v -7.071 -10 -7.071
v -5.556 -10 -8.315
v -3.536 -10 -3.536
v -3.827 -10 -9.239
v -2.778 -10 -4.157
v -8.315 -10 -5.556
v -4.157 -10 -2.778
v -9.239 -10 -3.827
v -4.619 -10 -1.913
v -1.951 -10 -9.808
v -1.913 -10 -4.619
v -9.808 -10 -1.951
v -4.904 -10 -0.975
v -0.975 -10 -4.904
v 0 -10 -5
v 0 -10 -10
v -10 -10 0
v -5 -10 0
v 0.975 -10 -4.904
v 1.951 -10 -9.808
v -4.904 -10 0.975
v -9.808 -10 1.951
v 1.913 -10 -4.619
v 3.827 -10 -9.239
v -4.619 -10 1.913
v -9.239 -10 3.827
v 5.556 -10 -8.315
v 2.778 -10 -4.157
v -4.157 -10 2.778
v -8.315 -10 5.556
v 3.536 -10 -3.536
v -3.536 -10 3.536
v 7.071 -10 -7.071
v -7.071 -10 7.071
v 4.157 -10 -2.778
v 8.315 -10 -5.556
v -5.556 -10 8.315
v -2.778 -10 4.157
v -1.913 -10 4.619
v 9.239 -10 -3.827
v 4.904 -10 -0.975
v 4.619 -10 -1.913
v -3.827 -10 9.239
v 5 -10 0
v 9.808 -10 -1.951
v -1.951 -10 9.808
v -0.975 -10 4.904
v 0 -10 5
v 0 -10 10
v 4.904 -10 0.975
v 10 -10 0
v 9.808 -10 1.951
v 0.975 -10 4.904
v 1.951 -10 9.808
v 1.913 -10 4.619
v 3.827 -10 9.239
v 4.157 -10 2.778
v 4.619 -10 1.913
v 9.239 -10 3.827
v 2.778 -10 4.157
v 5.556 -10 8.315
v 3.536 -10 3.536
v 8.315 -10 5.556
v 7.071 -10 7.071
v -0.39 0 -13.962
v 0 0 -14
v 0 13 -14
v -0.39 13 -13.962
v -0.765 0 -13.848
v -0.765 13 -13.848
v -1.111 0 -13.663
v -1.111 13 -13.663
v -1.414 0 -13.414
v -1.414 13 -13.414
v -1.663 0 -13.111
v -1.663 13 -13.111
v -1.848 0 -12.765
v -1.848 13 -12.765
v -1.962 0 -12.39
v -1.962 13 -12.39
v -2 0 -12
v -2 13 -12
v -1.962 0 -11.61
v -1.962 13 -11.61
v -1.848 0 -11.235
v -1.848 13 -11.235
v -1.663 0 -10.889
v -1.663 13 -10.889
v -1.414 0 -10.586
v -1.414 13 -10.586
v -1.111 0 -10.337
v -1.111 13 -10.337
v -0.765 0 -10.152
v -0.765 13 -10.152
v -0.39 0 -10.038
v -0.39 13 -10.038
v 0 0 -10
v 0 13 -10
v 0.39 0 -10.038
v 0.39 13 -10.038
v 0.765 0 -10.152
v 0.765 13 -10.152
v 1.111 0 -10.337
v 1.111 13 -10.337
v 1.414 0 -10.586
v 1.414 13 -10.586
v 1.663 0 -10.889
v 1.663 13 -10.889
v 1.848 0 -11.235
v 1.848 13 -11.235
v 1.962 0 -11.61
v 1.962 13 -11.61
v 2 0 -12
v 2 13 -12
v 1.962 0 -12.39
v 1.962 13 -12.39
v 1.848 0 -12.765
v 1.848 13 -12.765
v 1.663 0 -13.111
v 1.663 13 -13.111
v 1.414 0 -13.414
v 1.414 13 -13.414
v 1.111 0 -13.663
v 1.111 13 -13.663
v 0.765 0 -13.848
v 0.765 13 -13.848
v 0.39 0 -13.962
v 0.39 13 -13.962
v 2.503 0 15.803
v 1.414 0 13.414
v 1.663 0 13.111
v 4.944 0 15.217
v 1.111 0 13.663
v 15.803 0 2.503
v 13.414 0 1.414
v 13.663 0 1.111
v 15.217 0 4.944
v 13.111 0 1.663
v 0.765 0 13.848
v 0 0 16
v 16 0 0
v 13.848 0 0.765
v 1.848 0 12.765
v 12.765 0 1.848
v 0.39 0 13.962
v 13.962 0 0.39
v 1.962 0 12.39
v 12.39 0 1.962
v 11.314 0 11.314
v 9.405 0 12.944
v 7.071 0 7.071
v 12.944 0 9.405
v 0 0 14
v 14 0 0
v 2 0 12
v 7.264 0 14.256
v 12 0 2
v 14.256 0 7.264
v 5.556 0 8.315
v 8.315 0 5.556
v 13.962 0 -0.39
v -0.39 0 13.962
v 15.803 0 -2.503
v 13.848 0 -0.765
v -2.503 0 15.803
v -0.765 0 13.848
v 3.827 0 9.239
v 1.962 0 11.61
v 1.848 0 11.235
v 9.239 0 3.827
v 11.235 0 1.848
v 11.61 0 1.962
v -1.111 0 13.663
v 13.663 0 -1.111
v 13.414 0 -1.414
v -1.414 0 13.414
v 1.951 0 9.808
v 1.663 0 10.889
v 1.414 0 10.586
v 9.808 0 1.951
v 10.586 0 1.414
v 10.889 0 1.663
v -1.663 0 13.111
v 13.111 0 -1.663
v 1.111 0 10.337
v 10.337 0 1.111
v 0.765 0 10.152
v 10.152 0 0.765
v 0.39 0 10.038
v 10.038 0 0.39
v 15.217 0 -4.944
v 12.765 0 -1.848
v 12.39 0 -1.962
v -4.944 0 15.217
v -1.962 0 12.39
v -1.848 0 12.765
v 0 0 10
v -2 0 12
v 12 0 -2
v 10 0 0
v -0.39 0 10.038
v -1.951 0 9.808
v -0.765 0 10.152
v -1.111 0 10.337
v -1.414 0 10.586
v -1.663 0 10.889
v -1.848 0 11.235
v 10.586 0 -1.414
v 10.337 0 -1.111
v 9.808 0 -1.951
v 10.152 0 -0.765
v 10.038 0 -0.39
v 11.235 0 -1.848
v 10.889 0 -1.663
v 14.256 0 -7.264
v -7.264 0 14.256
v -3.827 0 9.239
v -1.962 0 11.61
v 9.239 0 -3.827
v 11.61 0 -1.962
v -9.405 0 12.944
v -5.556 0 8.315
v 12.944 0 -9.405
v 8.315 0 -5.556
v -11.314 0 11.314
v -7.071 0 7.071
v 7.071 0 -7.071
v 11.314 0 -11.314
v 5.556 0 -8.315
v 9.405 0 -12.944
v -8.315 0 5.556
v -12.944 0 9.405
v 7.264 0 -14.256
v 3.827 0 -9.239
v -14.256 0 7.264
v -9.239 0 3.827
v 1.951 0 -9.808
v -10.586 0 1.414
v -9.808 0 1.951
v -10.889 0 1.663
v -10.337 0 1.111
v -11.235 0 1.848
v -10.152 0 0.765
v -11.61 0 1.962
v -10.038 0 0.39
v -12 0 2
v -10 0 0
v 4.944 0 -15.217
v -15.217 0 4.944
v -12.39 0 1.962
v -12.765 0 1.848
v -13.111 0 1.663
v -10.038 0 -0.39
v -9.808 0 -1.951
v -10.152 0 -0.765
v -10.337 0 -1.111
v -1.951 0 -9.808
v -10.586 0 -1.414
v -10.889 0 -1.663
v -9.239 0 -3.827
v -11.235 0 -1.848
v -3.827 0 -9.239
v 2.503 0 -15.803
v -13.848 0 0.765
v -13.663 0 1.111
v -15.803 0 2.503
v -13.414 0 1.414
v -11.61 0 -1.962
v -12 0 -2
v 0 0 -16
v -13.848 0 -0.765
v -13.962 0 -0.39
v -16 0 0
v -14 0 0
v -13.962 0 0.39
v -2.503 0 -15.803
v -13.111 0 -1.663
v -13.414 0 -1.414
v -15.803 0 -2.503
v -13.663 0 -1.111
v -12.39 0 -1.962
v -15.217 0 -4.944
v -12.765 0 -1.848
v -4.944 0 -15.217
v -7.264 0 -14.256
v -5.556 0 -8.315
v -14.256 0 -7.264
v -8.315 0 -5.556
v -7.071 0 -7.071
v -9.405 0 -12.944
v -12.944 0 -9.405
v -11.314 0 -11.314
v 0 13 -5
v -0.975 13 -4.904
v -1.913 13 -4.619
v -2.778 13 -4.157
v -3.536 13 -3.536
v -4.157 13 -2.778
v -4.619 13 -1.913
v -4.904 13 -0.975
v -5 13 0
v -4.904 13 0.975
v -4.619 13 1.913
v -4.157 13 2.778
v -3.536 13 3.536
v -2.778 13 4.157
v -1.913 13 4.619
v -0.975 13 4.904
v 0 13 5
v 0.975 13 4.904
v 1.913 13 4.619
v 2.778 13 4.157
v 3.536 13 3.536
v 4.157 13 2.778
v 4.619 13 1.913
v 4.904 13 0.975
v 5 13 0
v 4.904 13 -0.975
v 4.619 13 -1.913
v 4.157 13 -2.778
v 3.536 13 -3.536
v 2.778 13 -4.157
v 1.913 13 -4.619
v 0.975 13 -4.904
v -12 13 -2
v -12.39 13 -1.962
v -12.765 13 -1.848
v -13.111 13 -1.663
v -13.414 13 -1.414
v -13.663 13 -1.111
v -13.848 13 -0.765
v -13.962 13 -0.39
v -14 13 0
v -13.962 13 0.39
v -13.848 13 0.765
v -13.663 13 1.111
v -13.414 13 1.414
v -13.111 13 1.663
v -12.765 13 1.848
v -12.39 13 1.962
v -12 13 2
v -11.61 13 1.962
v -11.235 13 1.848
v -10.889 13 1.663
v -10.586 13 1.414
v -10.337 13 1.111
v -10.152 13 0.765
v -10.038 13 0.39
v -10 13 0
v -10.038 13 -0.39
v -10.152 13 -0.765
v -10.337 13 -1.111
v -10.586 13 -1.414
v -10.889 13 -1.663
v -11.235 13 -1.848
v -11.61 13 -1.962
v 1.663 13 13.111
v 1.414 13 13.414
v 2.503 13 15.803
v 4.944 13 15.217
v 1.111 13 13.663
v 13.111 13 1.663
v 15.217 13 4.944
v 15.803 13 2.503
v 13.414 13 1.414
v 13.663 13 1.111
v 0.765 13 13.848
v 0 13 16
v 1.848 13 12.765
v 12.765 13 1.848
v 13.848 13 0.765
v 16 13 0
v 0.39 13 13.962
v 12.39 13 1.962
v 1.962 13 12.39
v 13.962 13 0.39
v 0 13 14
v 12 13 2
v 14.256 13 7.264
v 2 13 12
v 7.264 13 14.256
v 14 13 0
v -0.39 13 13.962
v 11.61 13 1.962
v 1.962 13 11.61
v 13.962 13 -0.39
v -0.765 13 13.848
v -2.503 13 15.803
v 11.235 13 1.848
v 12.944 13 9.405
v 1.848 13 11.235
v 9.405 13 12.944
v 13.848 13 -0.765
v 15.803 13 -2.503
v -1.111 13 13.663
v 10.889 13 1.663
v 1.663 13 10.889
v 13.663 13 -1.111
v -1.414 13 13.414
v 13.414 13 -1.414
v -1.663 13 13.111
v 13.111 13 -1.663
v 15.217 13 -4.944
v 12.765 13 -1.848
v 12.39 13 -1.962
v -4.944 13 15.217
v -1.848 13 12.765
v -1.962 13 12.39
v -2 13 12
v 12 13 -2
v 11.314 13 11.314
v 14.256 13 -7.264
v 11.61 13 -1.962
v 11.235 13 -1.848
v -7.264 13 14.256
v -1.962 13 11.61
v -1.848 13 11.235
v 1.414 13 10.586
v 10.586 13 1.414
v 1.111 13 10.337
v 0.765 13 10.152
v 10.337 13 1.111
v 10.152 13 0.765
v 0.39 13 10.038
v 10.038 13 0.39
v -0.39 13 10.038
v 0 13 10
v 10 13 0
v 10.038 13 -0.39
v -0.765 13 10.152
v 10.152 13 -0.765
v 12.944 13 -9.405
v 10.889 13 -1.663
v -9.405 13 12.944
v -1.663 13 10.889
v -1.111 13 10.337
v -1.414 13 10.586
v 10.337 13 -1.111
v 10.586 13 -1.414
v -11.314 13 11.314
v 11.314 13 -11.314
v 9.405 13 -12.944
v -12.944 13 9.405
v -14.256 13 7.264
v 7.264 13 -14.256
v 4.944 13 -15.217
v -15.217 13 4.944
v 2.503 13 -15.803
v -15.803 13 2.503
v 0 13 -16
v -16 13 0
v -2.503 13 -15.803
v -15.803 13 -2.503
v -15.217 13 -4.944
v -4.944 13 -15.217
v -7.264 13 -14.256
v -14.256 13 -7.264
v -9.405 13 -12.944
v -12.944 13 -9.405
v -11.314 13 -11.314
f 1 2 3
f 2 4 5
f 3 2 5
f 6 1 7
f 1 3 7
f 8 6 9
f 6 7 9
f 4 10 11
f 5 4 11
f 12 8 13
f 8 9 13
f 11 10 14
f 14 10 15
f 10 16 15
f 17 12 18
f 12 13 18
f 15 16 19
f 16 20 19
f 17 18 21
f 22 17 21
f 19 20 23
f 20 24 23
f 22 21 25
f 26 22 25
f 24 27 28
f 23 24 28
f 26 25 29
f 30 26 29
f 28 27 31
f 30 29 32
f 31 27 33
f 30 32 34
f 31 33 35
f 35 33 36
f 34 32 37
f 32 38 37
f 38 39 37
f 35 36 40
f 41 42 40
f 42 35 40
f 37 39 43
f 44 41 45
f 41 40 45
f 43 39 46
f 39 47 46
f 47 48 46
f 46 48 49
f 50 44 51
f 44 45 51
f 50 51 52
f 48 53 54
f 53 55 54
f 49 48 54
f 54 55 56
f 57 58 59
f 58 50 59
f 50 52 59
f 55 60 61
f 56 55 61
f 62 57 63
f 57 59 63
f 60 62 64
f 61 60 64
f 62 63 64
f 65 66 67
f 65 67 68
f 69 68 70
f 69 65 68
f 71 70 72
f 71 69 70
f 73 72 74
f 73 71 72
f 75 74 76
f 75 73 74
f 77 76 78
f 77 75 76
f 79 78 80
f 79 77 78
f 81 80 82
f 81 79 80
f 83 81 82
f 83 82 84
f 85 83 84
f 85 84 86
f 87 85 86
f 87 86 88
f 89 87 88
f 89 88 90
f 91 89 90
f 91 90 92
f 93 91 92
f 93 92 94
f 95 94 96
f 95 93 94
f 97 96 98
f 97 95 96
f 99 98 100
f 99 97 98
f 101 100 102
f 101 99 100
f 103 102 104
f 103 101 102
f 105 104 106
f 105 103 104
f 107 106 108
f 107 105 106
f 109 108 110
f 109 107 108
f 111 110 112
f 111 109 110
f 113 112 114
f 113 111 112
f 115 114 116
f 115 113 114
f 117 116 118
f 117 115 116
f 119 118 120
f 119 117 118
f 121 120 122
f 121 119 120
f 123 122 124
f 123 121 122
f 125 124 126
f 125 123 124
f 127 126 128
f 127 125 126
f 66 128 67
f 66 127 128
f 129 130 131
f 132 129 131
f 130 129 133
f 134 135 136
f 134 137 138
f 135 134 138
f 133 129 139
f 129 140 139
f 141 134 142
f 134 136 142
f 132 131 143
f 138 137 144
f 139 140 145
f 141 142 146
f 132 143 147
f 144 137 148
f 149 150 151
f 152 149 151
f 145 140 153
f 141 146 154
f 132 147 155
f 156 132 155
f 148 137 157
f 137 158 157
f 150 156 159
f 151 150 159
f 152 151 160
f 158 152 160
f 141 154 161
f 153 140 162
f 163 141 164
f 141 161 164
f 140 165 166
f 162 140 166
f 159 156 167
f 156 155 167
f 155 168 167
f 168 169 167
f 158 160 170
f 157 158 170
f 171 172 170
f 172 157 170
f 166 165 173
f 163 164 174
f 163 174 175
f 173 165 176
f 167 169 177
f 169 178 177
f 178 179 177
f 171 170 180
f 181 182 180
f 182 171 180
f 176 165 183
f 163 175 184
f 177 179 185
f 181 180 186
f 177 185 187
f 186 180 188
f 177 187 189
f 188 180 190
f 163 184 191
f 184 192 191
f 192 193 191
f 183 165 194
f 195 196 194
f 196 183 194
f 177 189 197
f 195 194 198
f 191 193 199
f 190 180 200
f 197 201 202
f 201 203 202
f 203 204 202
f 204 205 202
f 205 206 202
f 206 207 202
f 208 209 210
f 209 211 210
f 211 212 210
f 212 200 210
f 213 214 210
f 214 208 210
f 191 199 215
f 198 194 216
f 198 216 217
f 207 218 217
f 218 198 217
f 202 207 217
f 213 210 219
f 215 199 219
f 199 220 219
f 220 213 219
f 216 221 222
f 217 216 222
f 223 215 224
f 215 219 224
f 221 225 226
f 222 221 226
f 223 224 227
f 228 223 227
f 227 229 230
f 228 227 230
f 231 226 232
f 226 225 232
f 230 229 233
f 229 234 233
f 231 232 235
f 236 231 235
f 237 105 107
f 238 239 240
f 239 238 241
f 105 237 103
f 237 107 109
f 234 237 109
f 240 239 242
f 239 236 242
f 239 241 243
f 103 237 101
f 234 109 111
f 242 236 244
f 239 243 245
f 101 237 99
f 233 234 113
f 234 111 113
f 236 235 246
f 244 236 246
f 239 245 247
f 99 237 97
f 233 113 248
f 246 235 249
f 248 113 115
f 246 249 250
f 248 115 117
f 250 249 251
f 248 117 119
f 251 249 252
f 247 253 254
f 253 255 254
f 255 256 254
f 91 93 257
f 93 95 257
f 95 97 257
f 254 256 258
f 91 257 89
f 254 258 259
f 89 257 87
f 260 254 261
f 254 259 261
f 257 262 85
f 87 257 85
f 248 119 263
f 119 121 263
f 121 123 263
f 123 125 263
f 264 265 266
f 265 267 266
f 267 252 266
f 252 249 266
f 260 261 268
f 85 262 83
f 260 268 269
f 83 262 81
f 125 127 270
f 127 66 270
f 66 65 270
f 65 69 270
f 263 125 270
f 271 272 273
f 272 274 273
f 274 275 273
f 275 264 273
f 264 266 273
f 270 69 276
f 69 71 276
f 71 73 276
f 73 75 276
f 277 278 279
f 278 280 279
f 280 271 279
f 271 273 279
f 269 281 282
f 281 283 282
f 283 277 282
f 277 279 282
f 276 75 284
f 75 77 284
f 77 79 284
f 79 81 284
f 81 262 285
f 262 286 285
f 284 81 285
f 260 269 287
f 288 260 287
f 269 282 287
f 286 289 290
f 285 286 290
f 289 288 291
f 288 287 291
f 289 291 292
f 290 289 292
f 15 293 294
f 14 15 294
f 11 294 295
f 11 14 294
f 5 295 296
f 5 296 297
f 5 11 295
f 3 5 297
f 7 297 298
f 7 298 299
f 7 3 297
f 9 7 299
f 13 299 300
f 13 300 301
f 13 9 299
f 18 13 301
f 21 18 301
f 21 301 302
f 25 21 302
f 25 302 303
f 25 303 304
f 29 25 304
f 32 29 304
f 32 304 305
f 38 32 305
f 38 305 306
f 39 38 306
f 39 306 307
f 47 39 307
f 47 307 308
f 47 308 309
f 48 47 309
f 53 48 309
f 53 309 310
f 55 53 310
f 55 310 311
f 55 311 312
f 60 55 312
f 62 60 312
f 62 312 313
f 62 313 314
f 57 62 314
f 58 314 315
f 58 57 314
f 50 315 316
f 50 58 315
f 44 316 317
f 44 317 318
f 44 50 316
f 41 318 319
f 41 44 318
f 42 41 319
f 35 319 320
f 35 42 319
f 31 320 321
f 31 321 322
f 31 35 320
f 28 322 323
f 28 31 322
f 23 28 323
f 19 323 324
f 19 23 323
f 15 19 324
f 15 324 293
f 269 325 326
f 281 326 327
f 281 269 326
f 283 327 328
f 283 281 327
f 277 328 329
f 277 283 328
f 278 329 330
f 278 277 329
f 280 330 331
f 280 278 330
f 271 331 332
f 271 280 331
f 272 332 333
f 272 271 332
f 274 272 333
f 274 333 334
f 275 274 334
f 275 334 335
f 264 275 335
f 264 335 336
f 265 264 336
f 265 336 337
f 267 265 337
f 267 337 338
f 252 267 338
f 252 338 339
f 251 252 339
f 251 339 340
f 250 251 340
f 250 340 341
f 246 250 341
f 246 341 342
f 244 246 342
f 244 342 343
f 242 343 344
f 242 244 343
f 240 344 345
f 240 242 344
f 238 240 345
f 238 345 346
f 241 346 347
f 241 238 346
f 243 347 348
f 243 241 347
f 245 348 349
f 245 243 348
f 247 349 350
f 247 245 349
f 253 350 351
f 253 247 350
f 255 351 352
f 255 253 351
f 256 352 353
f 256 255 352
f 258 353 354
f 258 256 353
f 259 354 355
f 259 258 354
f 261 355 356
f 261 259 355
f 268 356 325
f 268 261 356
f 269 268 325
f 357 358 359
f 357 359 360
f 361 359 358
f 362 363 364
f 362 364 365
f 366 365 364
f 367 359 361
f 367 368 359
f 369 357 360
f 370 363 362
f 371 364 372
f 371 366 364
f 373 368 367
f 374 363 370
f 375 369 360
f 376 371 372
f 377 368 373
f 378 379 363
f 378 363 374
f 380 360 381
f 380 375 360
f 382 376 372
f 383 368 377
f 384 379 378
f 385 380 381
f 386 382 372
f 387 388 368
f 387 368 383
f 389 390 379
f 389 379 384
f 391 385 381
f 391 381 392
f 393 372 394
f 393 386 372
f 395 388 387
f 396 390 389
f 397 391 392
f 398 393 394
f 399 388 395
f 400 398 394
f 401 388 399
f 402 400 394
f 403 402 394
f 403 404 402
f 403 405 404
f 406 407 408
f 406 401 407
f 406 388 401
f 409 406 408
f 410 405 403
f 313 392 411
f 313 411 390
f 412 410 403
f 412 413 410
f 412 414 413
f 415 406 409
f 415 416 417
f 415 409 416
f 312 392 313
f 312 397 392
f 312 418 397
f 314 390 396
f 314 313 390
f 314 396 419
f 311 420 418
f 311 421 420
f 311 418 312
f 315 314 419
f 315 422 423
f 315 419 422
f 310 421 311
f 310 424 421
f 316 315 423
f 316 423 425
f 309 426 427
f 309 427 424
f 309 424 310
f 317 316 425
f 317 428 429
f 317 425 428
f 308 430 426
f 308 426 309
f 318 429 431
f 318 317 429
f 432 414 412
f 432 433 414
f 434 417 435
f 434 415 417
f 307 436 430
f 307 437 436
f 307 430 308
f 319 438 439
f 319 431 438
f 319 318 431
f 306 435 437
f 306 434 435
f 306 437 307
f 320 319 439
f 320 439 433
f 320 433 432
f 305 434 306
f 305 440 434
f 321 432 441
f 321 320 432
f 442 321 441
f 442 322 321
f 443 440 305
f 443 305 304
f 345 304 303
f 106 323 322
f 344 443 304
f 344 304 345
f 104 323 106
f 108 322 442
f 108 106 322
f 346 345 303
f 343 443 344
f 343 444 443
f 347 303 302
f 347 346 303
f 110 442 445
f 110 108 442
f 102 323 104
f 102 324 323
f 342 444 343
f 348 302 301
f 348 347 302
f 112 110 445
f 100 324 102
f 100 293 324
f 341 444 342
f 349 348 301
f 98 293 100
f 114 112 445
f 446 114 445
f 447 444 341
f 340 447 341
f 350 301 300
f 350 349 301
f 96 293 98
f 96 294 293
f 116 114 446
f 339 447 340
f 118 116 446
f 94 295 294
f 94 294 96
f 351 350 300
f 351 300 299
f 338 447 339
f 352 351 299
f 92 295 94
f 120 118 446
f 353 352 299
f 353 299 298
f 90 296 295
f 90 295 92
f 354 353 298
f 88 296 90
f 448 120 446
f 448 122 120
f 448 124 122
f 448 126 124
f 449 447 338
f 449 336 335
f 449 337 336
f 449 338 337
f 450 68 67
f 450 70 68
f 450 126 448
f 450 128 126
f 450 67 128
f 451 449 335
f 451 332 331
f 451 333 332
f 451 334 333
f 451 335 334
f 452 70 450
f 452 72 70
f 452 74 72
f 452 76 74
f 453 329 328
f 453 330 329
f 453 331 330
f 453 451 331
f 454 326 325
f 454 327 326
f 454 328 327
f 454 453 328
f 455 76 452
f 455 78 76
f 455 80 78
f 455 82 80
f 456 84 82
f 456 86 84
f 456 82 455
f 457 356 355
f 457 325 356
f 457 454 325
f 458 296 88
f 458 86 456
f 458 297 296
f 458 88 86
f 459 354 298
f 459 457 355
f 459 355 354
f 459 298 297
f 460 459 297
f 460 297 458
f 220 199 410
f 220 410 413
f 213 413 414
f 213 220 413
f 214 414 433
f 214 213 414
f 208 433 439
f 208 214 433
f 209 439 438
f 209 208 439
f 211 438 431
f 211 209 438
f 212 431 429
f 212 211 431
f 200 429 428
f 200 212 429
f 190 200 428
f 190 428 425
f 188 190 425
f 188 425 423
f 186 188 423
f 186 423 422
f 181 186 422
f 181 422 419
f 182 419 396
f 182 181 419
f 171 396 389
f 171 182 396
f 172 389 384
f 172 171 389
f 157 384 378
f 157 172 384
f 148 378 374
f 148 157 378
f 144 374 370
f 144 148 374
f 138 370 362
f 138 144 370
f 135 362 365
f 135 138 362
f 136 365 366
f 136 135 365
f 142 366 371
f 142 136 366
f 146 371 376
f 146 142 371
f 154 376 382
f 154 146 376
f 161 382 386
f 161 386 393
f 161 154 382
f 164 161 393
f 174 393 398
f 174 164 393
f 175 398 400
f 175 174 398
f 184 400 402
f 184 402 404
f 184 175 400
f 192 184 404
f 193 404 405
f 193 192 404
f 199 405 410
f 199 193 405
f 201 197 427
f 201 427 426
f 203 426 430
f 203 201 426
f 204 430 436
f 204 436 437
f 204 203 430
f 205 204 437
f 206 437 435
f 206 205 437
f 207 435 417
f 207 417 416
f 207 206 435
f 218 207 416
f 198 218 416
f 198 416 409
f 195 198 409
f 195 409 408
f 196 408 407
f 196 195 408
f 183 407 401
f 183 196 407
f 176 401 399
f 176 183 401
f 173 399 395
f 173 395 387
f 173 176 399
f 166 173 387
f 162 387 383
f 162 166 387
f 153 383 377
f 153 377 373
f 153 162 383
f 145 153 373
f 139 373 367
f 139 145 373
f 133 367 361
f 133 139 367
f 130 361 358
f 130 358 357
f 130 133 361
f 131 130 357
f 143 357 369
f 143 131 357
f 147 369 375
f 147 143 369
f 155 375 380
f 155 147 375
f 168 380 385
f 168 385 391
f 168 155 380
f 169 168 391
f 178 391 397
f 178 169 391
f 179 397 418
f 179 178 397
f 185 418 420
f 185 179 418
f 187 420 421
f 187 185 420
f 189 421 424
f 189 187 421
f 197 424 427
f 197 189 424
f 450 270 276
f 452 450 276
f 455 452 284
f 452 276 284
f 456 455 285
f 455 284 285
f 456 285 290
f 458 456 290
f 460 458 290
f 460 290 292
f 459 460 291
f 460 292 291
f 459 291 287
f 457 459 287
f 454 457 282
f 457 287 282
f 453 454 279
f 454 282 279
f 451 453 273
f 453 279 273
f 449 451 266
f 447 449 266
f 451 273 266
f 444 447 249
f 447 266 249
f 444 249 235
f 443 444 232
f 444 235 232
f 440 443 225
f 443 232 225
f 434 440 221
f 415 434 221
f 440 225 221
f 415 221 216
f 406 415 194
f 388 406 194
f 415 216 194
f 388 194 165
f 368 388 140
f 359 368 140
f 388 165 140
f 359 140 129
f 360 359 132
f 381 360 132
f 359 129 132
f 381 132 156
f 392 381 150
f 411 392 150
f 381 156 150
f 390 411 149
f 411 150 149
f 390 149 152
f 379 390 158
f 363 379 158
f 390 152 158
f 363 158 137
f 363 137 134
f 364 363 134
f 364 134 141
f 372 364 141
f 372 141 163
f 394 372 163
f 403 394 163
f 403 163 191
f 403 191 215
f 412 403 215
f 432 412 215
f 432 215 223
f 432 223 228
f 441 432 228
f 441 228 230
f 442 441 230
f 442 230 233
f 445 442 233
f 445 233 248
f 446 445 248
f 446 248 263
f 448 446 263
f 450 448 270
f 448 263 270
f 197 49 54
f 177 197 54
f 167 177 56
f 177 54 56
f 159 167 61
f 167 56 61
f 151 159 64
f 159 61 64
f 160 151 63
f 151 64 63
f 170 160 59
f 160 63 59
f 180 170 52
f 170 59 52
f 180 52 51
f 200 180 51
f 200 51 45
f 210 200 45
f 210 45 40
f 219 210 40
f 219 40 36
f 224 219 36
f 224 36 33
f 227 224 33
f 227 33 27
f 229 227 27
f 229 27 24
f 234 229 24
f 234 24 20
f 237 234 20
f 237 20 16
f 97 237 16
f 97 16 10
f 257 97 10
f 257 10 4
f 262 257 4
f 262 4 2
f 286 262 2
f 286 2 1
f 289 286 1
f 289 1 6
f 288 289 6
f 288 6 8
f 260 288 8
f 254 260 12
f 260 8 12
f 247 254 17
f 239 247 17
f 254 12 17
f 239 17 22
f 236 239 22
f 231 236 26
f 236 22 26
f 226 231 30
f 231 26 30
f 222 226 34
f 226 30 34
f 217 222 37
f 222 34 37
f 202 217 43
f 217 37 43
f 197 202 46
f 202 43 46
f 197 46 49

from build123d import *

# Parameters (mm, degrees)
SKETCH_1_R      = 16
SKETCH_1_R_2    = 2
SKETCH_1_R_3    = 5
EXTRUDE_1_DEPTH = 13
EXTRUDE_START   = -10
SKETCH_1_3_R    = 5
EXTRUDE_2_DEPTH = 10


with BuildPart() as part:
    # 草图1 → 凸台-拉伸1 (new body)
    with BuildSketch(Plane(origin=(0, 0, 0), x_dir=(1, 0, 0), z_dir=(0, 1, 0))):
        Circle(SKETCH_1_R)
        with Locations((0, -12)):
            Circle(SKETCH_1_R_2, mode=Mode.SUBTRACT)
        with Locations((-12, 0)):
            Circle(SKETCH_1_R_2, mode=Mode.SUBTRACT)
        with Locations((12, 0)):
            Circle(SKETCH_1_R_2, mode=Mode.SUBTRACT)
        with Locations((0, 12)):
            Circle(SKETCH_1_R_2, mode=Mode.SUBTRACT)
        Circle(SKETCH_1_R_3, mode=Mode.SUBTRACT)
    extrude(amount=EXTRUDE_1_DEPTH)

    # 草图1<3> → 凸台-拉伸2 (add)
    with BuildSketch(Plane(origin=(0, 0, 0), x_dir=(1, 0, 0), z_dir=(0, 1, 0)).offset(EXTRUDE_START)):
        with BuildLine():
            ThreePointArc((10, 0), (7.071067809, 7.071067815), (-9e-09, 10))
            ThreePointArc((-9e-09, 10), (-7.071067815, 7.071067809), (-10, 0))
            ThreePointArc((-10, 0), (-7.071067813, -7.071067811), (-2e-09, -10))
            ThreePointArc((-2e-09, -10), (7.071067811, -7.071067813), (10, 0))
        make_face()
        Circle(SKETCH_1_3_R, mode=Mode.SUBTRACT)
    extrude(amount=EXTRUDE_2_DEPTH)


solid = part.part
